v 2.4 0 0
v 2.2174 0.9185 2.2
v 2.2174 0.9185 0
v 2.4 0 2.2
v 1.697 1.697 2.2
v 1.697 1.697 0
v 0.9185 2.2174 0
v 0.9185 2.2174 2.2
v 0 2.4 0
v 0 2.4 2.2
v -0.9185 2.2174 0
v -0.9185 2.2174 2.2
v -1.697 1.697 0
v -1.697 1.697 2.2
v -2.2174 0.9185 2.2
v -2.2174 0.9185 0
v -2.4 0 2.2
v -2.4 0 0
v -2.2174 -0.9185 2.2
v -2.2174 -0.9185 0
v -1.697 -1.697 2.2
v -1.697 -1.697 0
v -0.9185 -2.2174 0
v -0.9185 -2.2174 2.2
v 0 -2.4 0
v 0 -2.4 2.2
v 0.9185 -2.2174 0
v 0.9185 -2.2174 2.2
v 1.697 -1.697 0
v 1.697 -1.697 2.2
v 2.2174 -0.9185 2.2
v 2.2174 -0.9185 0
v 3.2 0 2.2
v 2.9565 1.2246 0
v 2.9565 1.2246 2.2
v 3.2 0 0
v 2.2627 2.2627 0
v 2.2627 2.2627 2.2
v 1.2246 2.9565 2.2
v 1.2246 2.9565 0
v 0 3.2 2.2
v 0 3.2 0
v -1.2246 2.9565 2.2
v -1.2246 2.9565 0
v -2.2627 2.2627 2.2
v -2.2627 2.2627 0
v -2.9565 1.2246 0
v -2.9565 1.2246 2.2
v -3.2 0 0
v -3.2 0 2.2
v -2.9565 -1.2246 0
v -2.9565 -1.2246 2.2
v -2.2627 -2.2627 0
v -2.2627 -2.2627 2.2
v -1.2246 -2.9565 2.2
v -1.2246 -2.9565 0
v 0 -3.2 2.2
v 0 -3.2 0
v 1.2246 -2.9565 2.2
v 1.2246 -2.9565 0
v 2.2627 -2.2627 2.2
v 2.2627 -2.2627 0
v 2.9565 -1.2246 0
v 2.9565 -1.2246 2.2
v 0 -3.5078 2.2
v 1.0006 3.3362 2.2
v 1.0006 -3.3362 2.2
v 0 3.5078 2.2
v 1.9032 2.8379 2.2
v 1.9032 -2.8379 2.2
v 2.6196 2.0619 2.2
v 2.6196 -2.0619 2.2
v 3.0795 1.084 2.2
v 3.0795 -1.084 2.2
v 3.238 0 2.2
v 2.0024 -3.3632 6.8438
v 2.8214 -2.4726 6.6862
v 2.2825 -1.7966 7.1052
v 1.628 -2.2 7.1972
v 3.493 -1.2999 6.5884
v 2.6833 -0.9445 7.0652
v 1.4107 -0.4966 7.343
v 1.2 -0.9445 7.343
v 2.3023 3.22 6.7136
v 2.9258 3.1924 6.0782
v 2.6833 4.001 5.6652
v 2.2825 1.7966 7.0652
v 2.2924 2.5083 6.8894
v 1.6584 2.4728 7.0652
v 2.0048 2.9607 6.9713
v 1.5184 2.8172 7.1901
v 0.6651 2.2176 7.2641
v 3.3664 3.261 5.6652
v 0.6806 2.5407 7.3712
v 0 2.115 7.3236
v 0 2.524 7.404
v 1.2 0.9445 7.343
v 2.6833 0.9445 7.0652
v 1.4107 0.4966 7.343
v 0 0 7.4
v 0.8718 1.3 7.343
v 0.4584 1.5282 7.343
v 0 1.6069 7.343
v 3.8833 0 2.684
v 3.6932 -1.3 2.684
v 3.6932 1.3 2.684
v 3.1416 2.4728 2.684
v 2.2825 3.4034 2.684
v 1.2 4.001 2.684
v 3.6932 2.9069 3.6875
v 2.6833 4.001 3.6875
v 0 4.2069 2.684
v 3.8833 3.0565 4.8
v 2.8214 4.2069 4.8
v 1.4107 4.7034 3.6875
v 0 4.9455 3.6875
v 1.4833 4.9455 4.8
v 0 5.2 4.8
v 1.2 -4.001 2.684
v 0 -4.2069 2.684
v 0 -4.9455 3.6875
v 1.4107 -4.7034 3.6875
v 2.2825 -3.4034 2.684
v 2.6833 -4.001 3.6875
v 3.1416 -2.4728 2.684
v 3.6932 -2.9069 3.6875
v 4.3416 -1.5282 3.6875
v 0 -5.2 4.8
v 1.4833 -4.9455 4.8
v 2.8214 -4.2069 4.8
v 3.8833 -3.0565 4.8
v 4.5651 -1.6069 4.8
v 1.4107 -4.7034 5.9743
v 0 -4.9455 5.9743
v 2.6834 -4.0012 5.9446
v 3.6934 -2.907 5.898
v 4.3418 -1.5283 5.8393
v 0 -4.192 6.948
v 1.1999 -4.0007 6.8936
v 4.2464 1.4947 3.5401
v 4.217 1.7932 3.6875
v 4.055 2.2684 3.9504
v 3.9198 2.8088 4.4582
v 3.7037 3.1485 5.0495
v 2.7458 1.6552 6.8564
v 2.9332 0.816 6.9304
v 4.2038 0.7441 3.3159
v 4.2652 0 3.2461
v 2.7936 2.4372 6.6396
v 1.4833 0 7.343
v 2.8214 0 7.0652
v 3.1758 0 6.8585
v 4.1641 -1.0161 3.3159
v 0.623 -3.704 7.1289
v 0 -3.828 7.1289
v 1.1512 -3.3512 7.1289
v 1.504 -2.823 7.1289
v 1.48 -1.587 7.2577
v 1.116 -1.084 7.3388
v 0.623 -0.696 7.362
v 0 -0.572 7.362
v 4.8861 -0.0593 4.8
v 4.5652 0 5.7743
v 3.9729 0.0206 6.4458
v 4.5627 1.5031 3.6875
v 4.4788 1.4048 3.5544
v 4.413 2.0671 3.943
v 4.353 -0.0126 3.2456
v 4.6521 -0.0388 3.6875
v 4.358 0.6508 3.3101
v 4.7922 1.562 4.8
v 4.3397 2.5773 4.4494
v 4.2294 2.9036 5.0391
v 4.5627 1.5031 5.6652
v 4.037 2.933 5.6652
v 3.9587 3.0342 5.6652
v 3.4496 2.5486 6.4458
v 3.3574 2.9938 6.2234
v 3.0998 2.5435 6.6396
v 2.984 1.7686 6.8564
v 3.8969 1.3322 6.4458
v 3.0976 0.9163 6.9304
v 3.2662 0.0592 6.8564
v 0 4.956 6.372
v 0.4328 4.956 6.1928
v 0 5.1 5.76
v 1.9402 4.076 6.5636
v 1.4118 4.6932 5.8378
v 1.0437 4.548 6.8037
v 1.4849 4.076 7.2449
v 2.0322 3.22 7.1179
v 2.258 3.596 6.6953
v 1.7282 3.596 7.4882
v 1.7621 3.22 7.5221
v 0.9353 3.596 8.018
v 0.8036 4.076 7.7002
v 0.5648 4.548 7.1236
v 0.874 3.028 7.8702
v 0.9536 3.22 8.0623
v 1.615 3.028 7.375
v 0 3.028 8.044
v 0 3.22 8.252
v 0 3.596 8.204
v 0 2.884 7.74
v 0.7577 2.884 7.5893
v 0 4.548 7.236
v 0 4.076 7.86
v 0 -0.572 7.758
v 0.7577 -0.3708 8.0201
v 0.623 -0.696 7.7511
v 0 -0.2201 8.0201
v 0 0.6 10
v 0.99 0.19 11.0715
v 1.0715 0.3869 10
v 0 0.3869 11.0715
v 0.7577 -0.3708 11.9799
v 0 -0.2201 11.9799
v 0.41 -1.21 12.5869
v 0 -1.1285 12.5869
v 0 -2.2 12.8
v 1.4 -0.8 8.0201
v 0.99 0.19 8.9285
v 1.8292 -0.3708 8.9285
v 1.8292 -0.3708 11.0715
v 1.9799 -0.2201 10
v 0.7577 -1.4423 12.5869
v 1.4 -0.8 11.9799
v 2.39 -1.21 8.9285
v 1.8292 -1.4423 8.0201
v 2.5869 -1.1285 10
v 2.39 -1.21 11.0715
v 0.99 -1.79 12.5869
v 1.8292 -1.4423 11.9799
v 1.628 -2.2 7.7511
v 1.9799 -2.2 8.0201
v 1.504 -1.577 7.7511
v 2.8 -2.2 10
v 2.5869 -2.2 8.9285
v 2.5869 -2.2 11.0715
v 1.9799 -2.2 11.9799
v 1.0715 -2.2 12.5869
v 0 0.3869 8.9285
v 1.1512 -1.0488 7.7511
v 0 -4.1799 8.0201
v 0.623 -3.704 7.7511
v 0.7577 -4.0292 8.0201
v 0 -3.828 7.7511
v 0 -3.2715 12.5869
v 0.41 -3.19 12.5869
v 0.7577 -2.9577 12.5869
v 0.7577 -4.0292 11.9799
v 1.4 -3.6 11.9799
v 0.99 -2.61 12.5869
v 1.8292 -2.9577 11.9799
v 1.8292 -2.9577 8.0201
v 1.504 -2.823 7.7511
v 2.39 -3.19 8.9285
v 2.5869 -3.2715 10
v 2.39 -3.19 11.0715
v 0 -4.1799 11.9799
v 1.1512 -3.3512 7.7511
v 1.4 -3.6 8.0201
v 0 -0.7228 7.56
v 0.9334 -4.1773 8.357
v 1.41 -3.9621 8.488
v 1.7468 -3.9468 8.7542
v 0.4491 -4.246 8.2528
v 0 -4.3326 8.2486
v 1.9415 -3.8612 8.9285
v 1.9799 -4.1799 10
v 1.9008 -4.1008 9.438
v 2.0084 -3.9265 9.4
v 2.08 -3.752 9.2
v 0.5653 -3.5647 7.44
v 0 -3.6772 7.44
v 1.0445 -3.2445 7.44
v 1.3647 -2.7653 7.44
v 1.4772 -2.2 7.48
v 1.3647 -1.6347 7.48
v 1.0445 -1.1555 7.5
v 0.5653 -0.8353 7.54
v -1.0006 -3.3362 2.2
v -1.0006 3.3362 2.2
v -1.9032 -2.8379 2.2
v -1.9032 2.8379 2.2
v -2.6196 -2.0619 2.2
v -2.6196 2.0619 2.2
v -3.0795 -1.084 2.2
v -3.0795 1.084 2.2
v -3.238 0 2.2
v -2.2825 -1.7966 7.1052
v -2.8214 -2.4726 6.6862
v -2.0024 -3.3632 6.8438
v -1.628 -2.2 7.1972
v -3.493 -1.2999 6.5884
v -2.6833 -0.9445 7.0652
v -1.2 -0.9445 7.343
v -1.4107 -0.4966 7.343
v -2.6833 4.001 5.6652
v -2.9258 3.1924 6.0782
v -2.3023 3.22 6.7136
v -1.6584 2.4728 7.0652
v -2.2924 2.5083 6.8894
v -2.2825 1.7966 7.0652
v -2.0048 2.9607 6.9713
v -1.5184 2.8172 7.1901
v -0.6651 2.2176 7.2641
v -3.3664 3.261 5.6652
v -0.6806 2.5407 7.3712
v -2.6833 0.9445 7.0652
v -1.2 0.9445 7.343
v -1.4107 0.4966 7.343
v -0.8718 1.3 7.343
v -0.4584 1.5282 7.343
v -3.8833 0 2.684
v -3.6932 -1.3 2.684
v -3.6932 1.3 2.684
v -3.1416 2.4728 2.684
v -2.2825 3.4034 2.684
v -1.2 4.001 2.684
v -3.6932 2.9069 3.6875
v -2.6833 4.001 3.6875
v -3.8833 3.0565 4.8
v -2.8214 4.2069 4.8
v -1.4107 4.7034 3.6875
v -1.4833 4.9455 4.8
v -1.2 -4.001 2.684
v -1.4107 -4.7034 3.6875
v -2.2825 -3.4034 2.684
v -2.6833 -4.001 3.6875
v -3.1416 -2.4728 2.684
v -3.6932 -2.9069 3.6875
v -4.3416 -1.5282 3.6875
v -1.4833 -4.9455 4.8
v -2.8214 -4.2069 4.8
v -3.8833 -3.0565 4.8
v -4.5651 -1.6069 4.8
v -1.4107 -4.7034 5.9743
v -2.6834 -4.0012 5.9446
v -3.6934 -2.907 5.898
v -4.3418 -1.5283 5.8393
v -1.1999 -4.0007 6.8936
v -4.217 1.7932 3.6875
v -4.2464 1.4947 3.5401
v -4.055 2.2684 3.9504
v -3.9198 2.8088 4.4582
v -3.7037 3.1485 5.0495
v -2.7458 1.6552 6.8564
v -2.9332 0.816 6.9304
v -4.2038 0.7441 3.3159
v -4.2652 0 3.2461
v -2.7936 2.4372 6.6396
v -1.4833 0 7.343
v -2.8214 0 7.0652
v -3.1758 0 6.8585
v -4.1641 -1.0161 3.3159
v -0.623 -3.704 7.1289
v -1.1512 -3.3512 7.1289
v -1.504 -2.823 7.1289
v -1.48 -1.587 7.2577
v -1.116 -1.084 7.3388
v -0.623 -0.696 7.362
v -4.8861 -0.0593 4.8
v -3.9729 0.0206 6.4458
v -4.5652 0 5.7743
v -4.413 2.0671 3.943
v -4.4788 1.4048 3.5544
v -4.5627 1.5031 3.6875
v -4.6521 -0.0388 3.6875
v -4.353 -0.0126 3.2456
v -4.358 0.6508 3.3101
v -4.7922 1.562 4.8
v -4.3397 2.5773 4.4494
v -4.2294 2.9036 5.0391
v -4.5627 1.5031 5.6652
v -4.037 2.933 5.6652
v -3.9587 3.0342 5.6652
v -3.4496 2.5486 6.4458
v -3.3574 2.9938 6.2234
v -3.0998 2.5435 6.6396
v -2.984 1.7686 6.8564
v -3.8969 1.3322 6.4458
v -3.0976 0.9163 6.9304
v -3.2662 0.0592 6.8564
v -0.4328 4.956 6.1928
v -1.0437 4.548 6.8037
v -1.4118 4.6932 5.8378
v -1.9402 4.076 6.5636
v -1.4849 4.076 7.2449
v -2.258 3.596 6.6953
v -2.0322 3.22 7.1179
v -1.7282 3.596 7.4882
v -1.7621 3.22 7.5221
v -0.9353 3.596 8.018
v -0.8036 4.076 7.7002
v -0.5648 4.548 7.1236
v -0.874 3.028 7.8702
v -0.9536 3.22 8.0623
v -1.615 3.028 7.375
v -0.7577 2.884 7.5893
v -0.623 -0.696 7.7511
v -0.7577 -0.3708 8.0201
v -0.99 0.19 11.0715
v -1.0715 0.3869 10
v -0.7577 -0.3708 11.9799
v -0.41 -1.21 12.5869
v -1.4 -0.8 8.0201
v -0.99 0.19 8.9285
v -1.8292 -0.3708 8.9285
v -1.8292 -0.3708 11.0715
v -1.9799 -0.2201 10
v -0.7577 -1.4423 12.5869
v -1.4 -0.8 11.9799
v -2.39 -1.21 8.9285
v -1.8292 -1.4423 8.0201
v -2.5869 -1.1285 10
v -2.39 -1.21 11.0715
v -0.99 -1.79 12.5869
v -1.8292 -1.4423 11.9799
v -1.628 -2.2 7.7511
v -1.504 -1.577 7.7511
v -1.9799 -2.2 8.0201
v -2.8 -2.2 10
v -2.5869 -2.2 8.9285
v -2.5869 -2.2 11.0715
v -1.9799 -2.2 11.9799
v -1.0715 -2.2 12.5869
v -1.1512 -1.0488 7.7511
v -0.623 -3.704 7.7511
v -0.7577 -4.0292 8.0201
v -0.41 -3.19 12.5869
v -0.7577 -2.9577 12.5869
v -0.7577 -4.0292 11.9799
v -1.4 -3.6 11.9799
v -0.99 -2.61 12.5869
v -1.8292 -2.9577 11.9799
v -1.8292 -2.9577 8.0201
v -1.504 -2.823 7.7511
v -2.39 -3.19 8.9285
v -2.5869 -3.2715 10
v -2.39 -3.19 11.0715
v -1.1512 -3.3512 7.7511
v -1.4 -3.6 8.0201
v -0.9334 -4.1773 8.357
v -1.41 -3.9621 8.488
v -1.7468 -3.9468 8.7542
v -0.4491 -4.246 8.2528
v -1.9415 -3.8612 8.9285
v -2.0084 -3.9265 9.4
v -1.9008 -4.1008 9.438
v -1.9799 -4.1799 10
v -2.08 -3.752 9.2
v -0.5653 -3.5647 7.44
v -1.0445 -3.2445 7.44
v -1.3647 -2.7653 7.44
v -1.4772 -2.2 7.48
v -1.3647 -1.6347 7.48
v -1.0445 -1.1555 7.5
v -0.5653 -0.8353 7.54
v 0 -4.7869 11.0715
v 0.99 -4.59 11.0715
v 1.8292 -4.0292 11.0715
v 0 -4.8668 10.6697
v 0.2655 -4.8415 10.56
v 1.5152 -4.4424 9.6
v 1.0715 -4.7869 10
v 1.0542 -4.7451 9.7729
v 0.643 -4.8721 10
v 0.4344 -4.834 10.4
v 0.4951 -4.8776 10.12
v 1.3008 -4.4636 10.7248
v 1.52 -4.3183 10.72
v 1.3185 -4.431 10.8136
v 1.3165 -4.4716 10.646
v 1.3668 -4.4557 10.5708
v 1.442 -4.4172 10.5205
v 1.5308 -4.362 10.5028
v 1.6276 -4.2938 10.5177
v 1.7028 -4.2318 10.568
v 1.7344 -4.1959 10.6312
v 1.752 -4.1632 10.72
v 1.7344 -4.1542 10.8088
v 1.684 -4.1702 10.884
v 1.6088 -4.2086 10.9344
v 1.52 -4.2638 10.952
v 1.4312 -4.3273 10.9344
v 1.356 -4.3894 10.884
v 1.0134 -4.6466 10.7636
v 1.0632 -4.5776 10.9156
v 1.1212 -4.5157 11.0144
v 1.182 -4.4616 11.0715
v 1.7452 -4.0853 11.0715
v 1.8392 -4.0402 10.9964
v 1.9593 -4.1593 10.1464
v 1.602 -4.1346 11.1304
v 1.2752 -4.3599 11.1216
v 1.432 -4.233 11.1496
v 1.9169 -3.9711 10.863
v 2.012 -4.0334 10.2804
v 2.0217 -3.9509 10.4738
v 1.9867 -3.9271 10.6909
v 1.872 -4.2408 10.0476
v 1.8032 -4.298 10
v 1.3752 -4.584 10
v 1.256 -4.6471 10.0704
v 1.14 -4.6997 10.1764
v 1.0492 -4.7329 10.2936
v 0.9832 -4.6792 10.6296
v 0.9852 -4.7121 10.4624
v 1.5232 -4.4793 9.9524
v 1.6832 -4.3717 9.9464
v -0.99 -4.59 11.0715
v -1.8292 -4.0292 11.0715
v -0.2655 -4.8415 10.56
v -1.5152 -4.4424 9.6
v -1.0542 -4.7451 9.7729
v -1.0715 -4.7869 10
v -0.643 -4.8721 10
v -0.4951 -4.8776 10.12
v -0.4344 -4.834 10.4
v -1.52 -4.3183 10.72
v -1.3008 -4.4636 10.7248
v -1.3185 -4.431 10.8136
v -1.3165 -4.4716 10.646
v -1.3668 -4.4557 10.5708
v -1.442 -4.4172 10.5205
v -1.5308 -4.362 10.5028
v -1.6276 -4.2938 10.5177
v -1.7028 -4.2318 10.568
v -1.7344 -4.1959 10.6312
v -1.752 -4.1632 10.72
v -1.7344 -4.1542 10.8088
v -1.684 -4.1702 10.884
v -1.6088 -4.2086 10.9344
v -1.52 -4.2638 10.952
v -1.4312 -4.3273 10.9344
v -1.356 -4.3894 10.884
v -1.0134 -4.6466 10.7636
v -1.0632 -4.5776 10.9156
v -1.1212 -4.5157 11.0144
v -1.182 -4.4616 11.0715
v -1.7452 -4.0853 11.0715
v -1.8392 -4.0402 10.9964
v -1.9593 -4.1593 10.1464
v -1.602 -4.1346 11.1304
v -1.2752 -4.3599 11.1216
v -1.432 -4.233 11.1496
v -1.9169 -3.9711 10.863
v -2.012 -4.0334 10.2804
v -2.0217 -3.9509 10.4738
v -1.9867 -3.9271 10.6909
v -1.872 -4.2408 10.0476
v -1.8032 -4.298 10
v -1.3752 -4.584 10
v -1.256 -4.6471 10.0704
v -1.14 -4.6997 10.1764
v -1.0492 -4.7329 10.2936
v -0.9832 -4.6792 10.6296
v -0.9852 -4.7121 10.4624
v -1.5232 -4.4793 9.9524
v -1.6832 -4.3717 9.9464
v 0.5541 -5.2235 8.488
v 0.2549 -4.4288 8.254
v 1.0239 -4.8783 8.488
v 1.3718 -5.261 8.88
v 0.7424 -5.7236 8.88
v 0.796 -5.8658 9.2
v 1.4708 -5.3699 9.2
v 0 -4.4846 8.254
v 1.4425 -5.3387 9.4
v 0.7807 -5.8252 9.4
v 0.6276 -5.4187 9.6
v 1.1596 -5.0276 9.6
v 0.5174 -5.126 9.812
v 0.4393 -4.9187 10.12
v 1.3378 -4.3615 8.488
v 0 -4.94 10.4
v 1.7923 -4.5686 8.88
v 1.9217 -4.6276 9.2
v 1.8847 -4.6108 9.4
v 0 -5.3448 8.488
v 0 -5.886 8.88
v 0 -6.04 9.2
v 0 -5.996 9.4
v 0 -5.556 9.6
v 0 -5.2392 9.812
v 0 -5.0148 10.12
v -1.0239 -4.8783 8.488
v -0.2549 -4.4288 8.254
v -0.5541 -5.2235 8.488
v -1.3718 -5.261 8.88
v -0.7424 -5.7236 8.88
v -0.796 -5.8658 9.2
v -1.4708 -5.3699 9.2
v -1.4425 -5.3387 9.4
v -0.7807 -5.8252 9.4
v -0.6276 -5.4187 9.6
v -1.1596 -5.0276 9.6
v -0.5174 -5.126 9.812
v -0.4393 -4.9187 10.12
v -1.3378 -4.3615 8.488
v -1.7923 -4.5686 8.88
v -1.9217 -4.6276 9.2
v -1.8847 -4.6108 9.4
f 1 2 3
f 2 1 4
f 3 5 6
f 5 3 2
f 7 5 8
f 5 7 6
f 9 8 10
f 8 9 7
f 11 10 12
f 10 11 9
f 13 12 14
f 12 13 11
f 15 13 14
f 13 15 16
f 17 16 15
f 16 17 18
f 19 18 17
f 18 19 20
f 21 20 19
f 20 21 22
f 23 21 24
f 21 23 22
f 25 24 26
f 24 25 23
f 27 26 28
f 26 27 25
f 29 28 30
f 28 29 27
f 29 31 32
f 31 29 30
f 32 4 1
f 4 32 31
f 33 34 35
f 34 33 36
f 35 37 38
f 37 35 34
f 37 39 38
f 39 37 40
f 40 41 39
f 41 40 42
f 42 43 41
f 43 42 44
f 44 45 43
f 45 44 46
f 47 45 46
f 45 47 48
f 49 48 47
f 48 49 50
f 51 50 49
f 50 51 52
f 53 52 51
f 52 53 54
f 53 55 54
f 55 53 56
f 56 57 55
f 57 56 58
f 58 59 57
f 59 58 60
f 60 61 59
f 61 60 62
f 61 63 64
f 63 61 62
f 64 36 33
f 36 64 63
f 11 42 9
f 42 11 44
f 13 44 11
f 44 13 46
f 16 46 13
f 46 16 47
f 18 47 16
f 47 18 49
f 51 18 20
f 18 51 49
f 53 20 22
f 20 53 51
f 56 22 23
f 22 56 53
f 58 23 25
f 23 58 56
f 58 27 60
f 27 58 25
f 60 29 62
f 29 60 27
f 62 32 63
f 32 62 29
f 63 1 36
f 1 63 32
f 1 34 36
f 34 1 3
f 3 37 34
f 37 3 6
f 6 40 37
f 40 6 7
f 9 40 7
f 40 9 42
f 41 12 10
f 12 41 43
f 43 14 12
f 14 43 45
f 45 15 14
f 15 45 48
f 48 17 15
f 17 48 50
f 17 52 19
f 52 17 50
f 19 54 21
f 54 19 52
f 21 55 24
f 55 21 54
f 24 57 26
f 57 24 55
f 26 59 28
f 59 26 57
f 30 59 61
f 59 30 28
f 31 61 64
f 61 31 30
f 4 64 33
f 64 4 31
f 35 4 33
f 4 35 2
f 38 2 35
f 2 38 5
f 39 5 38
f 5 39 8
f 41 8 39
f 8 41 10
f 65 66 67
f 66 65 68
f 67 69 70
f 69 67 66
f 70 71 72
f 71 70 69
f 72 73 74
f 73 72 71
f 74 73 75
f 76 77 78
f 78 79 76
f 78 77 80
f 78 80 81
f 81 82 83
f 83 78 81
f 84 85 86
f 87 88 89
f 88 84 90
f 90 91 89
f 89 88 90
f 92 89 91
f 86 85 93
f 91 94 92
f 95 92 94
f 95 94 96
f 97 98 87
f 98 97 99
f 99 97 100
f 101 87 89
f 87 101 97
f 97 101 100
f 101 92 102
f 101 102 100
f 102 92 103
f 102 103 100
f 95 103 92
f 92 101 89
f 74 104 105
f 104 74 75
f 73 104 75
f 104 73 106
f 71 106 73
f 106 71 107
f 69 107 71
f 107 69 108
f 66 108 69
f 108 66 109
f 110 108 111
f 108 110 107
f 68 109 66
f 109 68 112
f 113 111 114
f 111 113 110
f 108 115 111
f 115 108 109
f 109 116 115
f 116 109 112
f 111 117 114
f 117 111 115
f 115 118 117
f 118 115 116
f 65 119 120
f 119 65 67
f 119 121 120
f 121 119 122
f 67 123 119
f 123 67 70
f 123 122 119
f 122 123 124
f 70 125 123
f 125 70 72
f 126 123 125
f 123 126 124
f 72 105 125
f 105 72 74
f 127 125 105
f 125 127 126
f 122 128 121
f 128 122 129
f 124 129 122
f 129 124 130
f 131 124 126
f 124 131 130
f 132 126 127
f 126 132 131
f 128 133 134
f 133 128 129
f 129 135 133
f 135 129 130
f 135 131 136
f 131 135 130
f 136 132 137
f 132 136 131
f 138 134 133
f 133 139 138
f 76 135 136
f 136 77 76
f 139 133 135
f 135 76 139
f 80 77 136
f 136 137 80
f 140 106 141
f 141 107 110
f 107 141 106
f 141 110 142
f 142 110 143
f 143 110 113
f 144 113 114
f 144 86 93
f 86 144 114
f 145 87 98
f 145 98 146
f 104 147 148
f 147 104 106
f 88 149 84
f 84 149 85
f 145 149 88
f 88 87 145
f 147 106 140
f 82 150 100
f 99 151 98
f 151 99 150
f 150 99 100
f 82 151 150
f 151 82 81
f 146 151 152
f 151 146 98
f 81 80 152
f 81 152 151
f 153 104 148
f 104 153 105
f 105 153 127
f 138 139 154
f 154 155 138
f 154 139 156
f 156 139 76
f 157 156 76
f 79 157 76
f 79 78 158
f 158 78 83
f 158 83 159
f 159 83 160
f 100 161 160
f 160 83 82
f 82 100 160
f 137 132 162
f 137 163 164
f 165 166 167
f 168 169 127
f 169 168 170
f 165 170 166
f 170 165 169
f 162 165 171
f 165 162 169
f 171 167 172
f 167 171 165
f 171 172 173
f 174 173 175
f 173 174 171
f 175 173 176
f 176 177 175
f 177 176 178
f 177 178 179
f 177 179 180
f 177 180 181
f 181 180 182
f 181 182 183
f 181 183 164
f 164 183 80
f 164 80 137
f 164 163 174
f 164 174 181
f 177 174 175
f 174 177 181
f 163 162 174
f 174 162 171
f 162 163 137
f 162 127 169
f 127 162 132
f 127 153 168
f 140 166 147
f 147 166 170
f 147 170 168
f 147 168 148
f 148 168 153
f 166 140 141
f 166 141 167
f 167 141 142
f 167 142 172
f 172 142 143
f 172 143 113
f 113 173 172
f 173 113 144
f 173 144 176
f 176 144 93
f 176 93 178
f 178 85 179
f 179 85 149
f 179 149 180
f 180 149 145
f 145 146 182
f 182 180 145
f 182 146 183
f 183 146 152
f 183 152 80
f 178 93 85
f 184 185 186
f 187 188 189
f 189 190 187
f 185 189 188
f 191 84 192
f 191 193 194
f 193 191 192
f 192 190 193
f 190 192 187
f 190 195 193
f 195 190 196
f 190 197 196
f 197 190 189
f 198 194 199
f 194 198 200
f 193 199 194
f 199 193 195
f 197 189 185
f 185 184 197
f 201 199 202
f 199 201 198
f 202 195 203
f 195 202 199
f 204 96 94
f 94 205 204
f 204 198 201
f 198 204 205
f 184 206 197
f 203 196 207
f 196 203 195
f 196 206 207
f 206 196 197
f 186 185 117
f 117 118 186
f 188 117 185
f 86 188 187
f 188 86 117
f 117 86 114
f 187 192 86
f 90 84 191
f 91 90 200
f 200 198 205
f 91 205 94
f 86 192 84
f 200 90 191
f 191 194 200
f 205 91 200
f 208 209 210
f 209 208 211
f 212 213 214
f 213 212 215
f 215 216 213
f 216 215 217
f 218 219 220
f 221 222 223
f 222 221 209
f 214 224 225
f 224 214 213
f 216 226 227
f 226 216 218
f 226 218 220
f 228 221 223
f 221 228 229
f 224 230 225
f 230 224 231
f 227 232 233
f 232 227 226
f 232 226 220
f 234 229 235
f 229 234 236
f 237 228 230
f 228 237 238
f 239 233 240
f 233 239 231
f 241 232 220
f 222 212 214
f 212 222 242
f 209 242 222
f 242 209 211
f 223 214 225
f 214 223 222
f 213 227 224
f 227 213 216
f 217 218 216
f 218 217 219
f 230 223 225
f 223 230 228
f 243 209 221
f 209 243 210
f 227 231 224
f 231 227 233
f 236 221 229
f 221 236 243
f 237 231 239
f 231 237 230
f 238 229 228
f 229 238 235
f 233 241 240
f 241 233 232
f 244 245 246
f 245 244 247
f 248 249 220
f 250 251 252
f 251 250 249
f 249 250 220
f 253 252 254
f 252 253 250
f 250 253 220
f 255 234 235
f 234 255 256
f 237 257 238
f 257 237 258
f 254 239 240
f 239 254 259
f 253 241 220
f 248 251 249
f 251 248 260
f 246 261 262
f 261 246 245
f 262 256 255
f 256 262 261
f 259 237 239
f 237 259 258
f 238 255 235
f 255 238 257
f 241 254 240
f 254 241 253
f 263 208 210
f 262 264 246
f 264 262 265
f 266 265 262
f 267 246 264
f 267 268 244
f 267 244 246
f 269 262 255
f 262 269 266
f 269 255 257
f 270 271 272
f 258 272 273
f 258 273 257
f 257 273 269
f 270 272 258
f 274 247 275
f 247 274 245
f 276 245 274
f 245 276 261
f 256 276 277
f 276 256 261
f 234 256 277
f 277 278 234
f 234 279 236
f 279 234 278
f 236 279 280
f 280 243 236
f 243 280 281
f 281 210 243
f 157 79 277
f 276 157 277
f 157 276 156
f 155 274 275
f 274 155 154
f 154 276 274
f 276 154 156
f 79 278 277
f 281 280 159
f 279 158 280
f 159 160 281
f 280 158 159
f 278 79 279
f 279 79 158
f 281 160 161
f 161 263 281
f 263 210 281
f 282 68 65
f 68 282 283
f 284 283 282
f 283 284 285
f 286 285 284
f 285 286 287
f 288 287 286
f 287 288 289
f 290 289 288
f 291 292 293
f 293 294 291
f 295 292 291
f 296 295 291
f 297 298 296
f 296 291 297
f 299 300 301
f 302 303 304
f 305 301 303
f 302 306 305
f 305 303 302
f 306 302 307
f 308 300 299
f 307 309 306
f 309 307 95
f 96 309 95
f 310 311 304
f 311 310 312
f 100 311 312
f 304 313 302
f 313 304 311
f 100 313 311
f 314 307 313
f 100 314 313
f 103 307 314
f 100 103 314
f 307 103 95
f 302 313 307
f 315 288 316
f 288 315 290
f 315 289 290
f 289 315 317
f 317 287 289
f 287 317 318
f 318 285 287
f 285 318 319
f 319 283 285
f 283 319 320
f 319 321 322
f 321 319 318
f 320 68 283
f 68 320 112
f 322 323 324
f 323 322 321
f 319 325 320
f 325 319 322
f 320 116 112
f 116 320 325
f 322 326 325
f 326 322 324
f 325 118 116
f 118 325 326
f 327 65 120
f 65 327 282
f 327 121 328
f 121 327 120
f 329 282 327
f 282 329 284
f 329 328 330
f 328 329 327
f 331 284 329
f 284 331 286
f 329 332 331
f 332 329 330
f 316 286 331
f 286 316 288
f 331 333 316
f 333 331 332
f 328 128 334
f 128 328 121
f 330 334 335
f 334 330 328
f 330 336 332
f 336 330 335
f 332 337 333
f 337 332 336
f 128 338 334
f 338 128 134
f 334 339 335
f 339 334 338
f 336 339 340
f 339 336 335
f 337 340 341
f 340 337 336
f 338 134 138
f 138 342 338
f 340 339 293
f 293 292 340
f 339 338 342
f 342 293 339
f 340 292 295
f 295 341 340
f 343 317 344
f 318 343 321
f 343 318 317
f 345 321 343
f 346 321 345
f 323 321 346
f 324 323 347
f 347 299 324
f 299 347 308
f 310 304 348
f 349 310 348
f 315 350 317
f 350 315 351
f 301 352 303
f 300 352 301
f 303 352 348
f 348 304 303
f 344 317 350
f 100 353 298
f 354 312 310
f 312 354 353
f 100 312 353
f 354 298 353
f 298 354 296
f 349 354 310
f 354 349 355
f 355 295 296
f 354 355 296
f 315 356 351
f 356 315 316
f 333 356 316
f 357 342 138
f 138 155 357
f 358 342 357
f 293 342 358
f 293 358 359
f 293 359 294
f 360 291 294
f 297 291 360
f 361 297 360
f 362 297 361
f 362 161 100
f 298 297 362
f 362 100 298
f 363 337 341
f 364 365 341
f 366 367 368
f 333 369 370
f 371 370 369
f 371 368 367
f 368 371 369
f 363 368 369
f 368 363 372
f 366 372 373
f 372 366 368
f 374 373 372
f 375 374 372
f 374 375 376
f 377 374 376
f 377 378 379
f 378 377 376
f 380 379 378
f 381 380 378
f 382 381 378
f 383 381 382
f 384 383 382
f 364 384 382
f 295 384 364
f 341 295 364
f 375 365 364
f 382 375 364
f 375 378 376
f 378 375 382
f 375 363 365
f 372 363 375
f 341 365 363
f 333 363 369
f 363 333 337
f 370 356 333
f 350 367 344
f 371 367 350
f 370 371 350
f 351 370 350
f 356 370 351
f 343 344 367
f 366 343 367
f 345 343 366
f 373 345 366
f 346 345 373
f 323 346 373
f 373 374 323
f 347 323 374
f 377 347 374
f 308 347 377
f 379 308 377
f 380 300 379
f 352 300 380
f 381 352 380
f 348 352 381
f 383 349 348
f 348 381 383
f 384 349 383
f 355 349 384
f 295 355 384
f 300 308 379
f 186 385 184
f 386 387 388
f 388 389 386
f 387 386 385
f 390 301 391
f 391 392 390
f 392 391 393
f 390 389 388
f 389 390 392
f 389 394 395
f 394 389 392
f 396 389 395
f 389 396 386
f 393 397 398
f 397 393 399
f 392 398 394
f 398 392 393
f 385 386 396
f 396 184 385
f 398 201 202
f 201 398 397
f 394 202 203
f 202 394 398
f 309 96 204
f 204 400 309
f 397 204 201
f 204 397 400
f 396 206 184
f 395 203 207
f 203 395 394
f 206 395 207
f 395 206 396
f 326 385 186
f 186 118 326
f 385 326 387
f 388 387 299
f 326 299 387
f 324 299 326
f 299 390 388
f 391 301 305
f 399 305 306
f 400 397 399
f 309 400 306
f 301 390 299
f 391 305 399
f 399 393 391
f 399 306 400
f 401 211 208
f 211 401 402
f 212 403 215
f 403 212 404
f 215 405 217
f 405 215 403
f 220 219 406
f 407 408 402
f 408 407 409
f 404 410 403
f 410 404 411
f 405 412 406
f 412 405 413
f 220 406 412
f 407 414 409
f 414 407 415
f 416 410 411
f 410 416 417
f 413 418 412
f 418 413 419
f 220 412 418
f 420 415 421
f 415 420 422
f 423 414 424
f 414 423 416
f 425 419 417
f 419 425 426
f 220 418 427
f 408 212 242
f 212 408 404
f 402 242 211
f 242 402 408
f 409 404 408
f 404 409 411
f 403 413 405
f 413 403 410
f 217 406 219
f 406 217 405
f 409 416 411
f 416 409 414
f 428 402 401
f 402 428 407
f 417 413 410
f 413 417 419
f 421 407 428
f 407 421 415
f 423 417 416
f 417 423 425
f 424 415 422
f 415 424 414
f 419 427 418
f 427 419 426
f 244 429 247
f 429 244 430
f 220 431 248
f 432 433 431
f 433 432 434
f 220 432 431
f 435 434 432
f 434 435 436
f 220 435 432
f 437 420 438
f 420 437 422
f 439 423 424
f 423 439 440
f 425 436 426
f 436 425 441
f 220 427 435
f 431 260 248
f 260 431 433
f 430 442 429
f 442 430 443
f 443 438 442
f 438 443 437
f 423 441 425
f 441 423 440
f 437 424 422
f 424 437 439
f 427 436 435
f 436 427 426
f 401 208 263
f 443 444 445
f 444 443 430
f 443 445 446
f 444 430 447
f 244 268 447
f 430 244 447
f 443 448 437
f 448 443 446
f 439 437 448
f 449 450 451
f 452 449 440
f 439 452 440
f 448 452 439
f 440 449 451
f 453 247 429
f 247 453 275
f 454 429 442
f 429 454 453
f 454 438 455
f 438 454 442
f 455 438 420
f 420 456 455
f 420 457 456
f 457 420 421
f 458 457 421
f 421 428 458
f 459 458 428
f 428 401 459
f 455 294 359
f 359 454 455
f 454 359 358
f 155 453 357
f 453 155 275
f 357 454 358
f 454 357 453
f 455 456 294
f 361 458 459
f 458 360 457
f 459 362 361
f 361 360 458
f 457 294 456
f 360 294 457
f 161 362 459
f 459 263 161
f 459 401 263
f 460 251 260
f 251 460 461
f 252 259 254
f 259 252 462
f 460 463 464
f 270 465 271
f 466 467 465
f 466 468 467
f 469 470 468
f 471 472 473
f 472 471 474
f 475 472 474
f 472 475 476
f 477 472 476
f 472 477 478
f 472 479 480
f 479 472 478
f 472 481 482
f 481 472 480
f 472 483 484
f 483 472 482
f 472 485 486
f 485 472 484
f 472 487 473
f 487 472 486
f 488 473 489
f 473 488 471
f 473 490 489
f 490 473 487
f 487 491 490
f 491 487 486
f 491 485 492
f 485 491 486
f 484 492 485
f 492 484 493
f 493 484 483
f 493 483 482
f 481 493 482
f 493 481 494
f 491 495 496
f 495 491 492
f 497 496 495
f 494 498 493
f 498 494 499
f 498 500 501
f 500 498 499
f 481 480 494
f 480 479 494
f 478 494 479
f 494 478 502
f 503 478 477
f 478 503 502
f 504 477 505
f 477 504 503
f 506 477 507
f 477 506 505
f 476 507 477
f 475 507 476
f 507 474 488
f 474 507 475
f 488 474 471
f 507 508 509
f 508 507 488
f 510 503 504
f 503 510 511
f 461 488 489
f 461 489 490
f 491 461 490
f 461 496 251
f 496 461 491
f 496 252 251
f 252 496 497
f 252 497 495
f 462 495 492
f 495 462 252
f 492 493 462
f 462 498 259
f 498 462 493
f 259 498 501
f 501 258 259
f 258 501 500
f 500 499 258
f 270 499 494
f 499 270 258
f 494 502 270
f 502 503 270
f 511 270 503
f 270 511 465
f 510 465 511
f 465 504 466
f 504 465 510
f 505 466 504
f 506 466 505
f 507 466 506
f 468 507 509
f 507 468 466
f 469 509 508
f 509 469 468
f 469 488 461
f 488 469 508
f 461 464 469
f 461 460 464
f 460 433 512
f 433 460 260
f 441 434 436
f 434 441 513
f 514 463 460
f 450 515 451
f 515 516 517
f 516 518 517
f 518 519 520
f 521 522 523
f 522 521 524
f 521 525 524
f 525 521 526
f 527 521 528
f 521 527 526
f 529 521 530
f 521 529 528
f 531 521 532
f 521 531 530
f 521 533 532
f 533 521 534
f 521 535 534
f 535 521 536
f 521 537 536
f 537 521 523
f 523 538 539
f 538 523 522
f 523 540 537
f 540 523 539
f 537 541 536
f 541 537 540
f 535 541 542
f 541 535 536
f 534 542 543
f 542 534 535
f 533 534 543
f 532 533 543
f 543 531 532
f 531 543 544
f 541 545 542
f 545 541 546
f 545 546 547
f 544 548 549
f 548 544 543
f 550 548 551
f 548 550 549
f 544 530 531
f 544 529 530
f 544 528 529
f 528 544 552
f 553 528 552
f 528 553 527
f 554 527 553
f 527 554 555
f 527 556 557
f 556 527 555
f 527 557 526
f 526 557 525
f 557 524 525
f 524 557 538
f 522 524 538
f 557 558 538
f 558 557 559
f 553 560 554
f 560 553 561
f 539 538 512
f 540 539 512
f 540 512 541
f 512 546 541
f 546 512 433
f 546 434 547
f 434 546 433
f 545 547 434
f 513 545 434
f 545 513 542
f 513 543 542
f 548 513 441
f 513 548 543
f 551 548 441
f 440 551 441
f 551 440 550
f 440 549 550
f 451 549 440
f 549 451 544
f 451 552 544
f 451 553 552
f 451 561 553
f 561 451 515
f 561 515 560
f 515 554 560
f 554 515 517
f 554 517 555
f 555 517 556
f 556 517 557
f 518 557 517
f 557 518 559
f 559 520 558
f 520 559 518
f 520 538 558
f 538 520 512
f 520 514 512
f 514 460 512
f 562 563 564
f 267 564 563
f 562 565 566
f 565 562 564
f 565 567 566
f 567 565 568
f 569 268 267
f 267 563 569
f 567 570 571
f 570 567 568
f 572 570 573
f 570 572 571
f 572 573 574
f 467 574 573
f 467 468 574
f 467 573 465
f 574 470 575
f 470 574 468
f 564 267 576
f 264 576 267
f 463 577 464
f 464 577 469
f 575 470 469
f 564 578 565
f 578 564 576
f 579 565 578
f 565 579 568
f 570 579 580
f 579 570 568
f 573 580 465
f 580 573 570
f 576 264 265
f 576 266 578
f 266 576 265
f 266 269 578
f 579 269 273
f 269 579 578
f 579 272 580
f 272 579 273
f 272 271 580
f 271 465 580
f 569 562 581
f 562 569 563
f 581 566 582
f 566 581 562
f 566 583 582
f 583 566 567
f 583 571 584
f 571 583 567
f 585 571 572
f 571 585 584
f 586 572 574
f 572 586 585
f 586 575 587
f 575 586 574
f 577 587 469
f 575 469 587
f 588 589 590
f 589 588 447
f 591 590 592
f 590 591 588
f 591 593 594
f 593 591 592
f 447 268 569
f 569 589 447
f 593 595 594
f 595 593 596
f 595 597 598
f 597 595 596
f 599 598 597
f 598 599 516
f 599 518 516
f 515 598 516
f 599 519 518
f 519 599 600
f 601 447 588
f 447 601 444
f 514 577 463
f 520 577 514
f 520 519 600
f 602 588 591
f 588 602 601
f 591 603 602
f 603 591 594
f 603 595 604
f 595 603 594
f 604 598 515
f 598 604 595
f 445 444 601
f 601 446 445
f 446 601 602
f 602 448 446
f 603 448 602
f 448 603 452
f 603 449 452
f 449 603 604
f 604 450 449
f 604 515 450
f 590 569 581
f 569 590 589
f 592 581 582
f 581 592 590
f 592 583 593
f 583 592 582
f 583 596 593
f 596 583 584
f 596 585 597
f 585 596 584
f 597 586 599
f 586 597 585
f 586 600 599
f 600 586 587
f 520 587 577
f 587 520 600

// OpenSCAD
use <../lib.scad>
use <s/49661p01s01.scad>
use <s/49661s03.scad>
function ldraw_lib__49661p02() = [
// 0 Animal Duckling with Black Eyes and White Pupil with Red Beak Pattern
// 0 Name: 49661p02.dat
// 0 Author: Gerald Lasser [GeraldLasser]
// 0 !LDRAW_ORG Part UPDATE 2020-03
// 0 !LICENSE Licensed under CC BY 4.0 : see CAreadme.txt
// 
// 0 BFC CERTIFY CCW
  [0,"BFC","CERTIFY"],
  [0,"BFC","CCW"],
// 
// 0 !KEYWORDS Bath, Bricklink 49661pb02, CMF Series 19, Rebrickable 49661pr0002
// 0 !KEYWORDS Rubber Duck
// 
// 0 !HISTORY 2020-12-29 [PTadmin] Official Update 2020-03
// 
// 
// 1 16 0 0 0 1 0 0 0 1 0 0 0 1 s\49661p01s01.dat
  [1,16,0,0,0,1,0,0,0,1,0,0,0,1, ldraw_lib__s__49661p01s01()],
// 
// 1 4 0 0 0 1 0 0 0 1 0 0 0 1 s\49661s03.dat
  [1,4,0,0,0,1,0,0,0,1,0,0,0,1, ldraw_lib__s__49661s03()],
// 1 4 0 0 0 -1 0 0 0 1 0 0 0 1 s\49661s03.dat
  [1,4,0,0,0,-1,0,0,0,1,0,0,0,1, ldraw_lib__s__49661s03()],
];
module ldraw_lib__49661p02(step=0, col=false, unit=2/5, alt=false, line=0.2, solid=!$preview)
    makepoly(ldraw_lib__49661p02(), step=step, col=col, unit=unit, alt=alt, line=line, solid=solid);
ldraw_lib__49661p02(line=0.2);
